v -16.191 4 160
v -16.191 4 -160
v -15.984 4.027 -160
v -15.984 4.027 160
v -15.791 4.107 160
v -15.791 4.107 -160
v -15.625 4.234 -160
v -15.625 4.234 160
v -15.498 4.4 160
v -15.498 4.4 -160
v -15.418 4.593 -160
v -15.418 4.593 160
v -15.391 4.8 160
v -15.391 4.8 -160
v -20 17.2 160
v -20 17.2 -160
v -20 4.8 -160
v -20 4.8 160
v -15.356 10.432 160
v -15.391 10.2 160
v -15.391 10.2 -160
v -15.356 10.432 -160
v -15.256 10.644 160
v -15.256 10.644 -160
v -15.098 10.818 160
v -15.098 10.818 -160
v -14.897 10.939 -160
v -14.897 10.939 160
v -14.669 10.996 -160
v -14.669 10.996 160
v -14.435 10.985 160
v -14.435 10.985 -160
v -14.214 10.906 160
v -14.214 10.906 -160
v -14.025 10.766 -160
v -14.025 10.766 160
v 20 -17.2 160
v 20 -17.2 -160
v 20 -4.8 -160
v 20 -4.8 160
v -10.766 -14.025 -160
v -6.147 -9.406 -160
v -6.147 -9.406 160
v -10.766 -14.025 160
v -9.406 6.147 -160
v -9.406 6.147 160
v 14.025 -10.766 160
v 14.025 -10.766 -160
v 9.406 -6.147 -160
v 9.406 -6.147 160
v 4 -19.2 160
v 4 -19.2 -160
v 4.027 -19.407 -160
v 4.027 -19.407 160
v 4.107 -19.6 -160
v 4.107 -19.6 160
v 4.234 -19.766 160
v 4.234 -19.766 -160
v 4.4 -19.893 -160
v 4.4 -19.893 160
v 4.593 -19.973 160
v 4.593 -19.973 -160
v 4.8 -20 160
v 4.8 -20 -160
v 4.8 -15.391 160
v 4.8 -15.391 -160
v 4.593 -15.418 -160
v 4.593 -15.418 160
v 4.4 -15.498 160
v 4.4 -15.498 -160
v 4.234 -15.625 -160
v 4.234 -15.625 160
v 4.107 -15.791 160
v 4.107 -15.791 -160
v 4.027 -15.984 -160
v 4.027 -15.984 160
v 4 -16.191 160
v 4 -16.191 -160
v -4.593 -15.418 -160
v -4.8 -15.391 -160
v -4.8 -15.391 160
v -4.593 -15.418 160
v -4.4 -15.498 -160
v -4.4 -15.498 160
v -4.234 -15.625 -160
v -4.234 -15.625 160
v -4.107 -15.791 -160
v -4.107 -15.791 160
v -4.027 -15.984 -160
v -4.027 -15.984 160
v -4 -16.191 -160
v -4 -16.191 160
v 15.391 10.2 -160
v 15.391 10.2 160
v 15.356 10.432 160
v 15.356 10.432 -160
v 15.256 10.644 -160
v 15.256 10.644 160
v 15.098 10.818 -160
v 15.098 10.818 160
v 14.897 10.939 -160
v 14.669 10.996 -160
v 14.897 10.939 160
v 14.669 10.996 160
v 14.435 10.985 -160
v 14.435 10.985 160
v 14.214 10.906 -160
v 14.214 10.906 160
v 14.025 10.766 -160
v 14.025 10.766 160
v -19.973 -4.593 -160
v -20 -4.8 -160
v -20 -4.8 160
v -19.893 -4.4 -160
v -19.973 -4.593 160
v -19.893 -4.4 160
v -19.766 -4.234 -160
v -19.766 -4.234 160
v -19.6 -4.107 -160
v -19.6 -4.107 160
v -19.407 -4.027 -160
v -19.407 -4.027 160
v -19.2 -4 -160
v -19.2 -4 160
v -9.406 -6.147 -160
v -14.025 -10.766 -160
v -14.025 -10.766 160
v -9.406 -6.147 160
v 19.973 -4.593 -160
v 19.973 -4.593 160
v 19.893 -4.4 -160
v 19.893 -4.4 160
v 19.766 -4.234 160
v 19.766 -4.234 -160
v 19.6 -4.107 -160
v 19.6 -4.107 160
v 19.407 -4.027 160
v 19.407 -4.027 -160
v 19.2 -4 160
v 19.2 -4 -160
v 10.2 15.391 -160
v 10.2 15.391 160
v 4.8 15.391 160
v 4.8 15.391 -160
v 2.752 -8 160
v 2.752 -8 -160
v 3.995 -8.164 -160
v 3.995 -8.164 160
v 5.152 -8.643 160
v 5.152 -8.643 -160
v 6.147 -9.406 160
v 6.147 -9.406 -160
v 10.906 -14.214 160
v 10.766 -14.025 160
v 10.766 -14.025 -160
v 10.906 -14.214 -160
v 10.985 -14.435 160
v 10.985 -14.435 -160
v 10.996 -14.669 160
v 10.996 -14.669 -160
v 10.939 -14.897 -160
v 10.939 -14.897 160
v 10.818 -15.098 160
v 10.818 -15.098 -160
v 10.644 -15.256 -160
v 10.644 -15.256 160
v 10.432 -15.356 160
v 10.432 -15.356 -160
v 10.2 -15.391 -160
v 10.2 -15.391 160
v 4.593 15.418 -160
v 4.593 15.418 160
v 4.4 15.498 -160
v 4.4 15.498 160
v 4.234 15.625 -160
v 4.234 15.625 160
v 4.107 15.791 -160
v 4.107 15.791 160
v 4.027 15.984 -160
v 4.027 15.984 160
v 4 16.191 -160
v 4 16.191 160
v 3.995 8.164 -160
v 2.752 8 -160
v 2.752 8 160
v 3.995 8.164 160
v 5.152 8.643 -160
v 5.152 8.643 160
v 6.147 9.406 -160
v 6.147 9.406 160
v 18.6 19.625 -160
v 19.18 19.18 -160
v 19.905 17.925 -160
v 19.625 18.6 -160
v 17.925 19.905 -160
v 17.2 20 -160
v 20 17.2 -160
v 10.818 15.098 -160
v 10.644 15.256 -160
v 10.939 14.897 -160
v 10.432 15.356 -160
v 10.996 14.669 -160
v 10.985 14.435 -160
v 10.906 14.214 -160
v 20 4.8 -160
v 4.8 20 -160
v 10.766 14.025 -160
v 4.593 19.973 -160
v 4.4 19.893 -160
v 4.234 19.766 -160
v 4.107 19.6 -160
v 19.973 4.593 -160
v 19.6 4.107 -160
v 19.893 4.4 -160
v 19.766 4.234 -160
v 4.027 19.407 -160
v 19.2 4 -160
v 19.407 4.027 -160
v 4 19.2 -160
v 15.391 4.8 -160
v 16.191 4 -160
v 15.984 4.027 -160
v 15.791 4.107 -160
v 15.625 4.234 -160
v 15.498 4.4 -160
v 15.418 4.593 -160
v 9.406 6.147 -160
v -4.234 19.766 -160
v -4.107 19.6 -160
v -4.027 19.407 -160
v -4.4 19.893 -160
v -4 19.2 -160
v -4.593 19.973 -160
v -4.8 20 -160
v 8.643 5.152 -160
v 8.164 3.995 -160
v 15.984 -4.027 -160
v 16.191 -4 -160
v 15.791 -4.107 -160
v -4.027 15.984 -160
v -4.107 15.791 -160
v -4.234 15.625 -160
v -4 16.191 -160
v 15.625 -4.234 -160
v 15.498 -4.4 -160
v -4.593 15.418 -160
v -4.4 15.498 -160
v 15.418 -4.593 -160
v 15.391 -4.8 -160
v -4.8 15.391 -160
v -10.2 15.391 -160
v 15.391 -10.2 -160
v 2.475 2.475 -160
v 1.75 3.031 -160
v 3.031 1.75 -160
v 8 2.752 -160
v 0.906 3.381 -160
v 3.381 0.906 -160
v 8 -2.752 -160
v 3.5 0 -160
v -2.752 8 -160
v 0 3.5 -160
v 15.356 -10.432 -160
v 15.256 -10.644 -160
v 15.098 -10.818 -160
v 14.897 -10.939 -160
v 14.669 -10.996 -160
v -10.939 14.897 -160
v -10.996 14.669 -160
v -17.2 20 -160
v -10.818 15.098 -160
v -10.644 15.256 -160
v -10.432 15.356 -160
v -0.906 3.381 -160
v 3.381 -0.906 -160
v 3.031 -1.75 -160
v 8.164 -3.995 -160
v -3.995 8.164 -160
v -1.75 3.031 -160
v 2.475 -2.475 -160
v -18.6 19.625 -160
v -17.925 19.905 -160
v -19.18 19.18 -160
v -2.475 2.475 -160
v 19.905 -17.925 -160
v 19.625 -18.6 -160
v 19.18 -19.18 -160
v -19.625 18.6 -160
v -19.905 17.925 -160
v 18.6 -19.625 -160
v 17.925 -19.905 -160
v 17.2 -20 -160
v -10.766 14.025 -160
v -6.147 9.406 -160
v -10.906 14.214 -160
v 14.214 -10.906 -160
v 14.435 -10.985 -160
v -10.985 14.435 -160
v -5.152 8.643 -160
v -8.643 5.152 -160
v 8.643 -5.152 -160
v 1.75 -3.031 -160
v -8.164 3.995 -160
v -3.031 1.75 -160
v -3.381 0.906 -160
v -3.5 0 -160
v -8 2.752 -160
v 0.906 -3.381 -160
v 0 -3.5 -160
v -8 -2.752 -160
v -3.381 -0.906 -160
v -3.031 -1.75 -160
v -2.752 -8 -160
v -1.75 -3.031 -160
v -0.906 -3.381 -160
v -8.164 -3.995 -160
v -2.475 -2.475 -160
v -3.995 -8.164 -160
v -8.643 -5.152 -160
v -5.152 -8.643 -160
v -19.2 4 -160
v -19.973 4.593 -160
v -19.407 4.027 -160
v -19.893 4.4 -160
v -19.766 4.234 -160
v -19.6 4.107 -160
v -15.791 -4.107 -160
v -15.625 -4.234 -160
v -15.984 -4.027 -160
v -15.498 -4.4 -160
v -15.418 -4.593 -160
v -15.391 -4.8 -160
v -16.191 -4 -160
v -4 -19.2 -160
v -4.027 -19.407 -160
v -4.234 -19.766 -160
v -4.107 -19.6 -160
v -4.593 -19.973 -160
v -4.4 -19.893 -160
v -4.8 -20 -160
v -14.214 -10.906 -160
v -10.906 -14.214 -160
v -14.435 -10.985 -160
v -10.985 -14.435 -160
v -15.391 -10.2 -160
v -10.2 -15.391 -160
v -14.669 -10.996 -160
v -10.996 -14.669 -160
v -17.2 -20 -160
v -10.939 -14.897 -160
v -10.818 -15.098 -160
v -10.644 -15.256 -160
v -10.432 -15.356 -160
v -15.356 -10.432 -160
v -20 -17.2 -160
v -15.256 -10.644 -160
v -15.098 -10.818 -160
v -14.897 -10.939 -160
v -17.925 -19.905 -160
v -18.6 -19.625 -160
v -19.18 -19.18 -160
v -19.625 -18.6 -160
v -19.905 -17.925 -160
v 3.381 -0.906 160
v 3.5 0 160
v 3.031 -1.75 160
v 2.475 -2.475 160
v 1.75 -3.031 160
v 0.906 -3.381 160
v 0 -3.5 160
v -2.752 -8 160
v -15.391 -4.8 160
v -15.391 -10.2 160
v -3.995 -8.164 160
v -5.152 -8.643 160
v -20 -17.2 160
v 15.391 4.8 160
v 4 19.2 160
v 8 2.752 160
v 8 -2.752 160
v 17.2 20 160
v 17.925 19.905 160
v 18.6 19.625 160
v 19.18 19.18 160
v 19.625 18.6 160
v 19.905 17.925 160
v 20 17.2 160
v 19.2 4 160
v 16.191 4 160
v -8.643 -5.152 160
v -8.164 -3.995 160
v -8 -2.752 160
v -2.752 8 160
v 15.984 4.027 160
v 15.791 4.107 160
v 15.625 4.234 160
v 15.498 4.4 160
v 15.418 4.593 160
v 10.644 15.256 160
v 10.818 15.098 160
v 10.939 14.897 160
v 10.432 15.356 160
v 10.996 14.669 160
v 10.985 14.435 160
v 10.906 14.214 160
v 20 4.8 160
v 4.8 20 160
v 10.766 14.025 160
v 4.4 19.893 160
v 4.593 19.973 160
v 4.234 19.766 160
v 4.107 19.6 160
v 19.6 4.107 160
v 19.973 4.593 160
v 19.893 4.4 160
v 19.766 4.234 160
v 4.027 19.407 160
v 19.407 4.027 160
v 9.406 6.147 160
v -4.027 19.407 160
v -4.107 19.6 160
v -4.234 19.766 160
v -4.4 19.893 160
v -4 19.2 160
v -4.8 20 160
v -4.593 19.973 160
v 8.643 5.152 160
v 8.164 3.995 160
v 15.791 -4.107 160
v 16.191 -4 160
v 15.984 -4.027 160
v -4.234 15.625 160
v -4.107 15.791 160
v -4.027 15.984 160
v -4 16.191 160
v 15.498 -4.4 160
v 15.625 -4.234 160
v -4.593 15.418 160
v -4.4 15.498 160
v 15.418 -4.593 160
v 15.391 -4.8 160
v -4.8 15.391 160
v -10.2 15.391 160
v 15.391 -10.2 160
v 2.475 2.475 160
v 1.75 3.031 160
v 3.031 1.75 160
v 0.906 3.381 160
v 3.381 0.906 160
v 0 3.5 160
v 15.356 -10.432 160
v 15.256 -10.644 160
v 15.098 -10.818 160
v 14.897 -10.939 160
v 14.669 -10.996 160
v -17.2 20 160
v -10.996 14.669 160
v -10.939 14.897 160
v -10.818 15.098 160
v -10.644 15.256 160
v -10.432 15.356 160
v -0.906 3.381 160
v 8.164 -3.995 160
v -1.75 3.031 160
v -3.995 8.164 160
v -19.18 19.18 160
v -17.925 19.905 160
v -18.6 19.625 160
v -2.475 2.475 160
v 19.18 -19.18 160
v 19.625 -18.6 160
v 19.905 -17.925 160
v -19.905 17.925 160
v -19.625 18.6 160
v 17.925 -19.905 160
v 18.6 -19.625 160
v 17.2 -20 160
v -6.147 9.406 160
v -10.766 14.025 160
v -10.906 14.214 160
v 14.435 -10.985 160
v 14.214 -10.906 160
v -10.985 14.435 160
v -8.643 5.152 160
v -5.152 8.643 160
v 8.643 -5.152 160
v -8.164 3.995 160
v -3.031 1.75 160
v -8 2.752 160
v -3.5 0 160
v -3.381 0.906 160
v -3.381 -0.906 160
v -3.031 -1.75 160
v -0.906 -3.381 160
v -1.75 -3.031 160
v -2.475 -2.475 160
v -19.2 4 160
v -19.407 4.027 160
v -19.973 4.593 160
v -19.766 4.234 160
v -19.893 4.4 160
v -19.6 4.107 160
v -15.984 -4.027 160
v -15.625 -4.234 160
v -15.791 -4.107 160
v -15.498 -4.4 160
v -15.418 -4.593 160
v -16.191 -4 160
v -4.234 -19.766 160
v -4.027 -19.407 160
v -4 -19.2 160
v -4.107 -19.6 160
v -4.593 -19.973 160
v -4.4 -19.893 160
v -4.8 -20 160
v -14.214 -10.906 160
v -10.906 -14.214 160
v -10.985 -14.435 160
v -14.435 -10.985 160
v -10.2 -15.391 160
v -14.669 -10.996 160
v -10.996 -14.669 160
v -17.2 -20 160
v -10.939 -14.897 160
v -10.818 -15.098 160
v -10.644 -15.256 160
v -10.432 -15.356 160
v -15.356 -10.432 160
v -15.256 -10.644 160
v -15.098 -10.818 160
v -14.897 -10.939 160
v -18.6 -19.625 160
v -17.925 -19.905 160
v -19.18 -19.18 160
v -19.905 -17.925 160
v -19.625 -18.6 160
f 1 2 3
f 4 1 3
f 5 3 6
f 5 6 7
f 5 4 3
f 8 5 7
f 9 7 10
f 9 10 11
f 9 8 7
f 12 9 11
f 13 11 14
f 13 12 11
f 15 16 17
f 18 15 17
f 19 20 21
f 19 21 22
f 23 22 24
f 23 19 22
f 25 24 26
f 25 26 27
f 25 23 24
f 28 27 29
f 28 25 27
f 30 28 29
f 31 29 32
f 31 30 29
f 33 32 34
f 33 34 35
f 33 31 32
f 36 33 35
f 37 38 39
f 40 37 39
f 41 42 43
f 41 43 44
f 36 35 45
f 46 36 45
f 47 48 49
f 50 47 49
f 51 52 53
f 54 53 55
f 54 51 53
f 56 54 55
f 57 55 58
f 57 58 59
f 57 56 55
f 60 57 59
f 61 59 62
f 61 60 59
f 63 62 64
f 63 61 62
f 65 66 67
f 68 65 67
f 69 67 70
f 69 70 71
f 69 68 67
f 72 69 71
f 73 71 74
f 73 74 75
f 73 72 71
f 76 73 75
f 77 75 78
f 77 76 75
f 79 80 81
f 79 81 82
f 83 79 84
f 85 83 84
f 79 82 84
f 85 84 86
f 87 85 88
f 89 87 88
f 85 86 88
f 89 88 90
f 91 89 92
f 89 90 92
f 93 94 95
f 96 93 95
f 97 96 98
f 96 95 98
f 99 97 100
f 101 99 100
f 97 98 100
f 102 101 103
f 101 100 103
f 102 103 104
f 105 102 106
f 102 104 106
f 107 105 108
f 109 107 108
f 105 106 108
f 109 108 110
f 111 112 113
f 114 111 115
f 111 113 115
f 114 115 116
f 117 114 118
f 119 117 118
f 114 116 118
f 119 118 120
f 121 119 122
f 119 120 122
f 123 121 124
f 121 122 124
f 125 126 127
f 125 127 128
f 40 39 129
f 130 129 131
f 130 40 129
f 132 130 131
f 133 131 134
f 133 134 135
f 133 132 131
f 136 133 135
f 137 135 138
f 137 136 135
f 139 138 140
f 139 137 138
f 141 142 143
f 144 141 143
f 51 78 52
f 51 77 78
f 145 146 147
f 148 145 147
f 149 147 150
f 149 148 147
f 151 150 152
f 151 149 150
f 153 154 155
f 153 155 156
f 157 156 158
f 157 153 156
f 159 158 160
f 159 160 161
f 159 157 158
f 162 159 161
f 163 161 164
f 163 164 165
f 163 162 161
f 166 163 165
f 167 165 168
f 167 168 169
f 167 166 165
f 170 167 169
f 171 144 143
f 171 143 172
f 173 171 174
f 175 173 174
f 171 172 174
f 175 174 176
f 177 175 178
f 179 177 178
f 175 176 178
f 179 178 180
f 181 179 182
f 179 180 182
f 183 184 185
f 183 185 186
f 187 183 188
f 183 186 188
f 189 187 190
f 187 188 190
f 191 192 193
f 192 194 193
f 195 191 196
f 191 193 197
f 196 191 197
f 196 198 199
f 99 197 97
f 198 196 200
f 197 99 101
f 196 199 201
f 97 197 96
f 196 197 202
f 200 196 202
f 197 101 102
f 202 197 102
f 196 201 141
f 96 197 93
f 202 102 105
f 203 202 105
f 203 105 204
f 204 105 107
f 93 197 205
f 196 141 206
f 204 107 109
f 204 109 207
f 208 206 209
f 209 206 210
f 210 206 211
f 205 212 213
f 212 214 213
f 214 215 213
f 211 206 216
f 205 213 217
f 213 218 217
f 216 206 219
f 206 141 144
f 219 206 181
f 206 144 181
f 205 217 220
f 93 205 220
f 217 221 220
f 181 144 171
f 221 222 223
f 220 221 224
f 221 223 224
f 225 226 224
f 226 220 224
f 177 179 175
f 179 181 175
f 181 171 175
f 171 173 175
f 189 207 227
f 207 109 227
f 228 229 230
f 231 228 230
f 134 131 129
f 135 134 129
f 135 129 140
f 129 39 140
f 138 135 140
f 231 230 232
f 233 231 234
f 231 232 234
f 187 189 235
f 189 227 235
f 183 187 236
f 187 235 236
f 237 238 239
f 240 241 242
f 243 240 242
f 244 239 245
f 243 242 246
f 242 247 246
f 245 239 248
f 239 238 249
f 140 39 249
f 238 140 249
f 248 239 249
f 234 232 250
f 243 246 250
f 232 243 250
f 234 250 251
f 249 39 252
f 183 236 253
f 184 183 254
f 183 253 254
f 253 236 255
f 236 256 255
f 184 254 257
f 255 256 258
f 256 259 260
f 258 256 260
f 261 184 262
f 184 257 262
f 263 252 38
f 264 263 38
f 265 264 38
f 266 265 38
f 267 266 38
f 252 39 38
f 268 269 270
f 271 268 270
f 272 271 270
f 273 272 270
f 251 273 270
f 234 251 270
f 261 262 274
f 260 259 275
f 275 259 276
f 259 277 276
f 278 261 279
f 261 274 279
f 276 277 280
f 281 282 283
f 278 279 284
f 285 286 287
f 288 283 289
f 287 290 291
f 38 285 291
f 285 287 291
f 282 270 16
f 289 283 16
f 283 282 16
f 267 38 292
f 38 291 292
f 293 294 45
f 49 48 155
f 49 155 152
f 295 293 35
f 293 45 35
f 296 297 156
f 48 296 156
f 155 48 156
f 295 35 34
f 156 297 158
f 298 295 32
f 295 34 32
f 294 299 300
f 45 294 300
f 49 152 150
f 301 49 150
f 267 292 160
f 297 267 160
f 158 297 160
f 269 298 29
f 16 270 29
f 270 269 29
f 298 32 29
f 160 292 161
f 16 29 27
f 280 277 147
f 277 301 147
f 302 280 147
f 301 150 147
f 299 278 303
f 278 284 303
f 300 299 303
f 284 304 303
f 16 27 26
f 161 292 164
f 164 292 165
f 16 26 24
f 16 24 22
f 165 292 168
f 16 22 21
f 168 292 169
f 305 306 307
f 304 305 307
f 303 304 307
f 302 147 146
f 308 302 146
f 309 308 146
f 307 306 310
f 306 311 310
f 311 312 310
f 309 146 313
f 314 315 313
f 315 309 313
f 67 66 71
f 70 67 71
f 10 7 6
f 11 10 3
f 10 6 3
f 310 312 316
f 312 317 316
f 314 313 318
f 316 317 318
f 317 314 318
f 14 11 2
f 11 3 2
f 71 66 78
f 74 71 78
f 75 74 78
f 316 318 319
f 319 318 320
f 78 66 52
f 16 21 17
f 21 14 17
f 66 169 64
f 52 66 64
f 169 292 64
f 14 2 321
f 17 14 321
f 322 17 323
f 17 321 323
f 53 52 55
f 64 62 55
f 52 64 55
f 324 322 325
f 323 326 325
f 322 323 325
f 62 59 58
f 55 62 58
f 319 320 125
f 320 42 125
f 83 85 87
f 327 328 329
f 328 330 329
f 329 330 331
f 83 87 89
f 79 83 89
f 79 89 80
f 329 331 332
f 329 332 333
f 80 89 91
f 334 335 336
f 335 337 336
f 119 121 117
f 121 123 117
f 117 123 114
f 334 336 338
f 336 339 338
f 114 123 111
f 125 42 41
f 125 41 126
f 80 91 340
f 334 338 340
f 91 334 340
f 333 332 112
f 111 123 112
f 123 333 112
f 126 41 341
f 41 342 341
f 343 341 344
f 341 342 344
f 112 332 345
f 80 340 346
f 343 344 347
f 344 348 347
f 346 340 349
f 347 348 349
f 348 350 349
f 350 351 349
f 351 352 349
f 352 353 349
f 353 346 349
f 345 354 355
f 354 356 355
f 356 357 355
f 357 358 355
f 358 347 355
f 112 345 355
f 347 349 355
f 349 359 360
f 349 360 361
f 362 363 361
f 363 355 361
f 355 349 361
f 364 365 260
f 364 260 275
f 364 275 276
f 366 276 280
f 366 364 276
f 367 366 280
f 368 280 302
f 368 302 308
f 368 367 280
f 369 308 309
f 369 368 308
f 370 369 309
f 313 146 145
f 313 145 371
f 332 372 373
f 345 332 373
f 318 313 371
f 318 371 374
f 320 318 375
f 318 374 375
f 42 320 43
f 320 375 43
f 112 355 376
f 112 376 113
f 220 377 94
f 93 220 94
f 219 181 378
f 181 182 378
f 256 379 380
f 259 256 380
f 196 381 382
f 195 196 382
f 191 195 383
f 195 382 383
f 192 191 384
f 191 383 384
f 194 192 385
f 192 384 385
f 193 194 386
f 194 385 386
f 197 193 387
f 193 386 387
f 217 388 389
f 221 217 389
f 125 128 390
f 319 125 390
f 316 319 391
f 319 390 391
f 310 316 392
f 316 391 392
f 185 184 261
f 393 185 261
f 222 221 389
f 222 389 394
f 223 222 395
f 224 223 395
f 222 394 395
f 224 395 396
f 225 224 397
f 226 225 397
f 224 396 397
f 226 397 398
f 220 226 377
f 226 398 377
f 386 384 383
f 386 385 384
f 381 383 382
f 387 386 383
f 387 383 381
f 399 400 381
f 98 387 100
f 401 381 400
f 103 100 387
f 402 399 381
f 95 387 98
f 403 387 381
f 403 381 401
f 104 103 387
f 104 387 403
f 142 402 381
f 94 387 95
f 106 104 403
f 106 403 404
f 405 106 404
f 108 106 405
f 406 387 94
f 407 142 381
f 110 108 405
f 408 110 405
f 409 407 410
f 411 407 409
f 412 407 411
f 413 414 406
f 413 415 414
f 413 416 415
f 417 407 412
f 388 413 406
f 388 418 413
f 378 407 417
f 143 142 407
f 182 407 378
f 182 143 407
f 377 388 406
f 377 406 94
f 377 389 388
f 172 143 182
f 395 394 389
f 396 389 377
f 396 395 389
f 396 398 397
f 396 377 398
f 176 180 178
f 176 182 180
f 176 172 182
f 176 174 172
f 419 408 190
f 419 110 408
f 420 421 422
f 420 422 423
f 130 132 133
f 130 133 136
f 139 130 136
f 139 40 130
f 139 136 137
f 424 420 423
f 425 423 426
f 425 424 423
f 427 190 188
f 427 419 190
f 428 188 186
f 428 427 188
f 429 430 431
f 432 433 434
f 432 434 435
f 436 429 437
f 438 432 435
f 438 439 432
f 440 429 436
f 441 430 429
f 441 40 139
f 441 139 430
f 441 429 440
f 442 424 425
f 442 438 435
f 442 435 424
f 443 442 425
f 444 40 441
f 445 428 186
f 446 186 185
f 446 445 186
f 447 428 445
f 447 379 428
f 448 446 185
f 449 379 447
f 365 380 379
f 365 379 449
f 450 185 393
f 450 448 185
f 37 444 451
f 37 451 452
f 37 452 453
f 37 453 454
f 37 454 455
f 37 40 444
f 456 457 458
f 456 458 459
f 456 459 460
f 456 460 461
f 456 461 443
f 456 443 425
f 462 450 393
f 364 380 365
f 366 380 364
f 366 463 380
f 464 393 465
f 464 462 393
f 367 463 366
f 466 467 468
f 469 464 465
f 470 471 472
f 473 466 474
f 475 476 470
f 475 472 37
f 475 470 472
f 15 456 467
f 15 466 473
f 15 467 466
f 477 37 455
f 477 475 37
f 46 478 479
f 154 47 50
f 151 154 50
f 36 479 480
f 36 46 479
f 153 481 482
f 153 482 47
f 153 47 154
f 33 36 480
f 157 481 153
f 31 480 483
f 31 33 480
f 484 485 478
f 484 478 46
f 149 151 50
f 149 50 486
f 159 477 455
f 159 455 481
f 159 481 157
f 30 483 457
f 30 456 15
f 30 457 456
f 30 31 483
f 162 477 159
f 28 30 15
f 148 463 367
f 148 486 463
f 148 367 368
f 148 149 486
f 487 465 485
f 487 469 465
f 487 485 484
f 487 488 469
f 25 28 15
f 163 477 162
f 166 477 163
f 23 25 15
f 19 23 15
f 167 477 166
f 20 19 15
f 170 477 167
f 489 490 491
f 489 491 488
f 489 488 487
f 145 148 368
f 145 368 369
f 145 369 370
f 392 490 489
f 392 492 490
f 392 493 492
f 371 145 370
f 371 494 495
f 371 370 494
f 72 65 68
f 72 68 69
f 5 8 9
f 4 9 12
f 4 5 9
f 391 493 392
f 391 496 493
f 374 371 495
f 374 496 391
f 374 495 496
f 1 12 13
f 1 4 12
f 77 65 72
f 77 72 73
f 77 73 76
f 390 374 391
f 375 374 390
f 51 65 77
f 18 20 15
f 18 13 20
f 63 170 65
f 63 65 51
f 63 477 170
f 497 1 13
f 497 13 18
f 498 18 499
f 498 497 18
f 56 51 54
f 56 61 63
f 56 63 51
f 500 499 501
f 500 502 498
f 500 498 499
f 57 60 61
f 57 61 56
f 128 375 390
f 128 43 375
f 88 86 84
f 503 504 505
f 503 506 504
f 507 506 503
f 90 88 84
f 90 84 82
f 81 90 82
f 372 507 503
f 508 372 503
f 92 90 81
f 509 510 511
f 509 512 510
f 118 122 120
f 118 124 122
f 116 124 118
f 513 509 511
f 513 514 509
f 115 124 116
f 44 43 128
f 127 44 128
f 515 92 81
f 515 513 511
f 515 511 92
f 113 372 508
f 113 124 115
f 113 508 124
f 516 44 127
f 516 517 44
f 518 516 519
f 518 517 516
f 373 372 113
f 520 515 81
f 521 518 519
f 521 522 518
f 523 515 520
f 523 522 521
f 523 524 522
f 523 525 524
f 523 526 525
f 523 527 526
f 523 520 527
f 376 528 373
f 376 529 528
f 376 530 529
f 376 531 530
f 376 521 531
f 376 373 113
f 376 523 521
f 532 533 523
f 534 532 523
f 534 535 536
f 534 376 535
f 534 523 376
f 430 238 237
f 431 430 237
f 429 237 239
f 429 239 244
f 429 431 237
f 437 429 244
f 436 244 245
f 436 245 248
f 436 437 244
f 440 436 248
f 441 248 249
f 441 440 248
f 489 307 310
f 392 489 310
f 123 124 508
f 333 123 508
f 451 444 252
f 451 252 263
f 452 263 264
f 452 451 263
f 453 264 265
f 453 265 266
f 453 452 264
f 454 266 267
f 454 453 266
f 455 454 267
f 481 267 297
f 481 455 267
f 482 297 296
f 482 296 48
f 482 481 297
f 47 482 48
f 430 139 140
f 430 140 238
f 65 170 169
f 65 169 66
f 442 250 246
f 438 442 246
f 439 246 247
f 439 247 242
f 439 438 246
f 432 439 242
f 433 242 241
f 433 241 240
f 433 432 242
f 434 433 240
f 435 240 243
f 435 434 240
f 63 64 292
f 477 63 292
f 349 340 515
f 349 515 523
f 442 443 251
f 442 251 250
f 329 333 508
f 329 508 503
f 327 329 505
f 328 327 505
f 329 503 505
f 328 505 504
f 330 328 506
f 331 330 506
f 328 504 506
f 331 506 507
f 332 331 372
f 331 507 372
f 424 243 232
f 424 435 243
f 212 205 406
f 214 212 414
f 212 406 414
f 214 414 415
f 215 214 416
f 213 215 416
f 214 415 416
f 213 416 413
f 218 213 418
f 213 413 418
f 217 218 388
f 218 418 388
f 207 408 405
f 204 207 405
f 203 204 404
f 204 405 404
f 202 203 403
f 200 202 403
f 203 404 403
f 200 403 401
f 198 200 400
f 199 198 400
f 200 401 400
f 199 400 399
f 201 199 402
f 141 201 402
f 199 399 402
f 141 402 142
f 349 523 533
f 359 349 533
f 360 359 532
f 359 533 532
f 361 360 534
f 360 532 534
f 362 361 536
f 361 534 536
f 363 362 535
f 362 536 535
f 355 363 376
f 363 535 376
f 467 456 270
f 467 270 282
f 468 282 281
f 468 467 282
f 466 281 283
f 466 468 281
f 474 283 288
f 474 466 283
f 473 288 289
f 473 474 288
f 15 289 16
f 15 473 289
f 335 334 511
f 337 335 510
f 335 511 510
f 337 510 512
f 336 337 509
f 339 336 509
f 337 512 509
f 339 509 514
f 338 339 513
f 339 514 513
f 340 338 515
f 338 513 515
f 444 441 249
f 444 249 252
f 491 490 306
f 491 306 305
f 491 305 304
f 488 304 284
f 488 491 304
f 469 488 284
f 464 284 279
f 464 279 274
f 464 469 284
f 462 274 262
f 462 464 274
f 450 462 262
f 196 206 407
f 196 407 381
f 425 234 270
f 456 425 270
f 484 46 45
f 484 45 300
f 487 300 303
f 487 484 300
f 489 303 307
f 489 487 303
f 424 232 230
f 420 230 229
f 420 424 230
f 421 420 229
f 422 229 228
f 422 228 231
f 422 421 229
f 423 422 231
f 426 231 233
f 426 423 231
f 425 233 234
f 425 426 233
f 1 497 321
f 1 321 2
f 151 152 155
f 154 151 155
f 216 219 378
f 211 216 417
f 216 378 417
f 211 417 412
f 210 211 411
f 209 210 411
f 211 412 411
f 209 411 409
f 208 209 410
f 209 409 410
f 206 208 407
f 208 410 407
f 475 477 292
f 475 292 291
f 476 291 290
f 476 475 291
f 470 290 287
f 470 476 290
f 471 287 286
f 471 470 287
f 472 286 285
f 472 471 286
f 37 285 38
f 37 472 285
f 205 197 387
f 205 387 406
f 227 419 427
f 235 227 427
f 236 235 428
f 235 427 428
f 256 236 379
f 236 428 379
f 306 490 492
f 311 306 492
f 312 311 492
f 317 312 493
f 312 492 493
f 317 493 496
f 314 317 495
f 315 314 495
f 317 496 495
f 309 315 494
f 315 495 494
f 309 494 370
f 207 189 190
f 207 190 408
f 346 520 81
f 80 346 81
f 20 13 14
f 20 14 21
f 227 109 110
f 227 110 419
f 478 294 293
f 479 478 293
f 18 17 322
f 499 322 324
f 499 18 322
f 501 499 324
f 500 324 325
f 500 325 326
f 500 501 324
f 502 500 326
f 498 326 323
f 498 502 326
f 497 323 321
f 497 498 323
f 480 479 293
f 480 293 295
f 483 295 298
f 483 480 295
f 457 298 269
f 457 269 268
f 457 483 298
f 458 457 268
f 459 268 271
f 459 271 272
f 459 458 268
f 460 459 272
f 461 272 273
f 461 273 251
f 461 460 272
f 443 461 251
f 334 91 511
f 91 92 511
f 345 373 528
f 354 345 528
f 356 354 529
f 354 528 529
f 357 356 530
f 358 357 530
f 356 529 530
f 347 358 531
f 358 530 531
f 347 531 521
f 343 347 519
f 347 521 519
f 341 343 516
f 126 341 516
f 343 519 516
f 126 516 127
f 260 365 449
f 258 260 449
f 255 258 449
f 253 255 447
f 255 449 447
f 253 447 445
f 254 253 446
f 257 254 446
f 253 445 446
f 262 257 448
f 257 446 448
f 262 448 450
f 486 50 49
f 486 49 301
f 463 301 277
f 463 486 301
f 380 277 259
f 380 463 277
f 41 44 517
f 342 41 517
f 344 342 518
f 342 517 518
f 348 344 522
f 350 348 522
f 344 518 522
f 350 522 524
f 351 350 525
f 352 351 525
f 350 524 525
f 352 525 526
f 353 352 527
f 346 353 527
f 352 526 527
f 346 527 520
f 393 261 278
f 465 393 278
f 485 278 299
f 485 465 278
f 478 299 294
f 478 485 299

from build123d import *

# Parameters (mm, degrees)
BOSS_EXTRUDE1_DEPTH = 160


with BuildPart() as part:
    # Sketch4 → Boss-Extrude1 (new body, symmetric)
    with BuildSketch(Plane.XY):
        with BuildLine():
            Line((4.8, -20), (17.2, -20))
            ThreePointArc((17.2, -20), (19.179898987, -19.179898987), (20, -17.2))
            Line((20, -17.2), (20, -4.8))
            ThreePointArc((20, -4.8), (19.765685425, -4.234314575), (19.2, -4))
            Line((19.2, -4), (16.190663761, -4))
            ThreePointArc((16.190663761, -4), (15.624978336, -4.234314575), (15.390663761, -4.8))
            Line((15.390663761, -4.8), (15.390663761, -10.2))
            ThreePointArc((15.390663761, -10.2), (14.896810507, -10.939103626), (14.024978336, -10.765685425))
            Line((14.024978336, -10.765685425), (9.40588745, -6.146594539))
            ThreePointArc((9.40588745, -6.146594539), (8.365378244, -4.589362465), (8, -2.752481989))
            Line((8, -2.752481989), (8, 0))
            Line((8, 0), (3.5, 0))
            ThreePointArc((3.5, 0), (2.474873734, -2.474873734), (0, -3.5))
            Line((0, -3.5), (0, -8))
            Line((0, -8), (2.752481989, -8))
            ThreePointArc((2.752481989, -8), (4.589362465, -8.365378244), (6.146594539, -9.40588745))
            Line((6.146594539, -9.40588745), (10.765685425, -14.024978336))
            ThreePointArc((10.765685425, -14.024978336), (10.939103626, -14.896810507), (10.2, -15.390663761))
            Line((10.2, -15.390663761), (4.8, -15.390663761))
            ThreePointArc((4.8, -15.390663761), (4.234314575, -15.624978336), (4, -16.190663761))
            Line((4, -16.190663761), (4, -19.2))
            ThreePointArc((4, -19.2), (4.234314575, -19.765685425), (4.8, -20))
        make_face()
    extrude(amount=BOSS_EXTRUDE1_DEPTH, both=True)

    # Mirror1: part across plane


with BuildPart() as part_1:
    add(part.part)
    add(part.part.mirror(Plane(origin=(0, 0, 0), x_dir=(0, 0, 1), z_dir=(1, 0, 0))))

    # Mirror2: part across plane


with BuildPart() as part_2:
    add(part_1.part)
    add(part_1.part.mirror(Plane.ZX))


solid = part_2.part
